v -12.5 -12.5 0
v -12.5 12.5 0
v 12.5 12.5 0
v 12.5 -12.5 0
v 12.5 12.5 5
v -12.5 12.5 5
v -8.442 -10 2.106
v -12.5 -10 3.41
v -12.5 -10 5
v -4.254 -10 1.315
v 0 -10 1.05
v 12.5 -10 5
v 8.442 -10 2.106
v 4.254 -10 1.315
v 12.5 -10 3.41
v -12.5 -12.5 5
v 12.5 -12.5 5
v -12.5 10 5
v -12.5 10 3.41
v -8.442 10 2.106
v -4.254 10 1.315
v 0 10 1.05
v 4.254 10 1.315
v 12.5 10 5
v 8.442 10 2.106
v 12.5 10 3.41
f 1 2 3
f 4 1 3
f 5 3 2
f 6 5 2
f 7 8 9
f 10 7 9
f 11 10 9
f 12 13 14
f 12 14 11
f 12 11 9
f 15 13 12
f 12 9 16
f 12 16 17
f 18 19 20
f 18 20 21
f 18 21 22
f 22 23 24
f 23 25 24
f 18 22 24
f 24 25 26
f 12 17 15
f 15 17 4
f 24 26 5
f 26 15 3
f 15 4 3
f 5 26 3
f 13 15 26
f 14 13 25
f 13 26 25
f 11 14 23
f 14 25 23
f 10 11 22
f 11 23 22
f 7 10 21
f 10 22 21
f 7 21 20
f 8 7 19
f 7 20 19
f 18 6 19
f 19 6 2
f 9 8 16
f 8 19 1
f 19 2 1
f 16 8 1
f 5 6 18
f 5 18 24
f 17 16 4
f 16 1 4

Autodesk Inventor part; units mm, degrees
ref_plane "YZ Plane" through (0, 0, 0) normal (1, 0, 0) x (0, 1, 0)
ref_plane "XZ Plane" through (0, 0, 0) normal (0, 1, 0) x (-1, 0, 0)
sketch "Sketch1" plane through (0, 0, 0) normal (0, 0, 1) x (1, 0, 0)
  line L0 (-17.5, 0) -> (17.5, 0) construction
  line L1 (0, -17.5) -> (0, 17.5) construction
  line L2 (-12.5, -12.5) -> (12.5, -12.5)
  line L3 (12.5, -12.5) -> (12.5, 12.5)
  line L4 (12.5, 12.5) -> (-12.5, 12.5)
  line L5 (-12.5, 12.5) -> (-12.5, -12.5)
  line L6 (-12.5, -12.5) -> (12.5, 12.5) construction
  line L7 (12.5, -12.5) -> (-12.5, 12.5) construction
  point P0 (0, 0)
  dimension "d0" = 25
  dimension "d1" = 25
extrude "Extrusion1" add sketch "Sketch1" along normal blind 5
ref_plane "Work Plane1" through (-12.5, 10, 0) normal (0, 1, 0) x (1, 0, 0)
sketch "Sketch2" plane through (-12.5, 10, 0) normal (0, 1, 0) x (1, 0, 0)
  line L0 (25, 0) -> (0, 0) construction
  line L1 (0, 0) -> (0, -5) construction
  line L2 (25, -5) -> (0, -5) construction
  line L3 (25, 0) -> (25, -5) construction
  line L4 (12.5, 0) -> (12.5, -5) construction
  circle A0 centre (12.5, -35.334) radius 34.284
  line L5 (-3.4763, -5) -> (28.4763, -5)
  dimension "d5" = 68.568
  dimension "d6" = 30.334
extrude "Extrusion2" cut sketch "Sketch2" against normal blind 20
properties part number "00_cylindrical_lens_mould"
